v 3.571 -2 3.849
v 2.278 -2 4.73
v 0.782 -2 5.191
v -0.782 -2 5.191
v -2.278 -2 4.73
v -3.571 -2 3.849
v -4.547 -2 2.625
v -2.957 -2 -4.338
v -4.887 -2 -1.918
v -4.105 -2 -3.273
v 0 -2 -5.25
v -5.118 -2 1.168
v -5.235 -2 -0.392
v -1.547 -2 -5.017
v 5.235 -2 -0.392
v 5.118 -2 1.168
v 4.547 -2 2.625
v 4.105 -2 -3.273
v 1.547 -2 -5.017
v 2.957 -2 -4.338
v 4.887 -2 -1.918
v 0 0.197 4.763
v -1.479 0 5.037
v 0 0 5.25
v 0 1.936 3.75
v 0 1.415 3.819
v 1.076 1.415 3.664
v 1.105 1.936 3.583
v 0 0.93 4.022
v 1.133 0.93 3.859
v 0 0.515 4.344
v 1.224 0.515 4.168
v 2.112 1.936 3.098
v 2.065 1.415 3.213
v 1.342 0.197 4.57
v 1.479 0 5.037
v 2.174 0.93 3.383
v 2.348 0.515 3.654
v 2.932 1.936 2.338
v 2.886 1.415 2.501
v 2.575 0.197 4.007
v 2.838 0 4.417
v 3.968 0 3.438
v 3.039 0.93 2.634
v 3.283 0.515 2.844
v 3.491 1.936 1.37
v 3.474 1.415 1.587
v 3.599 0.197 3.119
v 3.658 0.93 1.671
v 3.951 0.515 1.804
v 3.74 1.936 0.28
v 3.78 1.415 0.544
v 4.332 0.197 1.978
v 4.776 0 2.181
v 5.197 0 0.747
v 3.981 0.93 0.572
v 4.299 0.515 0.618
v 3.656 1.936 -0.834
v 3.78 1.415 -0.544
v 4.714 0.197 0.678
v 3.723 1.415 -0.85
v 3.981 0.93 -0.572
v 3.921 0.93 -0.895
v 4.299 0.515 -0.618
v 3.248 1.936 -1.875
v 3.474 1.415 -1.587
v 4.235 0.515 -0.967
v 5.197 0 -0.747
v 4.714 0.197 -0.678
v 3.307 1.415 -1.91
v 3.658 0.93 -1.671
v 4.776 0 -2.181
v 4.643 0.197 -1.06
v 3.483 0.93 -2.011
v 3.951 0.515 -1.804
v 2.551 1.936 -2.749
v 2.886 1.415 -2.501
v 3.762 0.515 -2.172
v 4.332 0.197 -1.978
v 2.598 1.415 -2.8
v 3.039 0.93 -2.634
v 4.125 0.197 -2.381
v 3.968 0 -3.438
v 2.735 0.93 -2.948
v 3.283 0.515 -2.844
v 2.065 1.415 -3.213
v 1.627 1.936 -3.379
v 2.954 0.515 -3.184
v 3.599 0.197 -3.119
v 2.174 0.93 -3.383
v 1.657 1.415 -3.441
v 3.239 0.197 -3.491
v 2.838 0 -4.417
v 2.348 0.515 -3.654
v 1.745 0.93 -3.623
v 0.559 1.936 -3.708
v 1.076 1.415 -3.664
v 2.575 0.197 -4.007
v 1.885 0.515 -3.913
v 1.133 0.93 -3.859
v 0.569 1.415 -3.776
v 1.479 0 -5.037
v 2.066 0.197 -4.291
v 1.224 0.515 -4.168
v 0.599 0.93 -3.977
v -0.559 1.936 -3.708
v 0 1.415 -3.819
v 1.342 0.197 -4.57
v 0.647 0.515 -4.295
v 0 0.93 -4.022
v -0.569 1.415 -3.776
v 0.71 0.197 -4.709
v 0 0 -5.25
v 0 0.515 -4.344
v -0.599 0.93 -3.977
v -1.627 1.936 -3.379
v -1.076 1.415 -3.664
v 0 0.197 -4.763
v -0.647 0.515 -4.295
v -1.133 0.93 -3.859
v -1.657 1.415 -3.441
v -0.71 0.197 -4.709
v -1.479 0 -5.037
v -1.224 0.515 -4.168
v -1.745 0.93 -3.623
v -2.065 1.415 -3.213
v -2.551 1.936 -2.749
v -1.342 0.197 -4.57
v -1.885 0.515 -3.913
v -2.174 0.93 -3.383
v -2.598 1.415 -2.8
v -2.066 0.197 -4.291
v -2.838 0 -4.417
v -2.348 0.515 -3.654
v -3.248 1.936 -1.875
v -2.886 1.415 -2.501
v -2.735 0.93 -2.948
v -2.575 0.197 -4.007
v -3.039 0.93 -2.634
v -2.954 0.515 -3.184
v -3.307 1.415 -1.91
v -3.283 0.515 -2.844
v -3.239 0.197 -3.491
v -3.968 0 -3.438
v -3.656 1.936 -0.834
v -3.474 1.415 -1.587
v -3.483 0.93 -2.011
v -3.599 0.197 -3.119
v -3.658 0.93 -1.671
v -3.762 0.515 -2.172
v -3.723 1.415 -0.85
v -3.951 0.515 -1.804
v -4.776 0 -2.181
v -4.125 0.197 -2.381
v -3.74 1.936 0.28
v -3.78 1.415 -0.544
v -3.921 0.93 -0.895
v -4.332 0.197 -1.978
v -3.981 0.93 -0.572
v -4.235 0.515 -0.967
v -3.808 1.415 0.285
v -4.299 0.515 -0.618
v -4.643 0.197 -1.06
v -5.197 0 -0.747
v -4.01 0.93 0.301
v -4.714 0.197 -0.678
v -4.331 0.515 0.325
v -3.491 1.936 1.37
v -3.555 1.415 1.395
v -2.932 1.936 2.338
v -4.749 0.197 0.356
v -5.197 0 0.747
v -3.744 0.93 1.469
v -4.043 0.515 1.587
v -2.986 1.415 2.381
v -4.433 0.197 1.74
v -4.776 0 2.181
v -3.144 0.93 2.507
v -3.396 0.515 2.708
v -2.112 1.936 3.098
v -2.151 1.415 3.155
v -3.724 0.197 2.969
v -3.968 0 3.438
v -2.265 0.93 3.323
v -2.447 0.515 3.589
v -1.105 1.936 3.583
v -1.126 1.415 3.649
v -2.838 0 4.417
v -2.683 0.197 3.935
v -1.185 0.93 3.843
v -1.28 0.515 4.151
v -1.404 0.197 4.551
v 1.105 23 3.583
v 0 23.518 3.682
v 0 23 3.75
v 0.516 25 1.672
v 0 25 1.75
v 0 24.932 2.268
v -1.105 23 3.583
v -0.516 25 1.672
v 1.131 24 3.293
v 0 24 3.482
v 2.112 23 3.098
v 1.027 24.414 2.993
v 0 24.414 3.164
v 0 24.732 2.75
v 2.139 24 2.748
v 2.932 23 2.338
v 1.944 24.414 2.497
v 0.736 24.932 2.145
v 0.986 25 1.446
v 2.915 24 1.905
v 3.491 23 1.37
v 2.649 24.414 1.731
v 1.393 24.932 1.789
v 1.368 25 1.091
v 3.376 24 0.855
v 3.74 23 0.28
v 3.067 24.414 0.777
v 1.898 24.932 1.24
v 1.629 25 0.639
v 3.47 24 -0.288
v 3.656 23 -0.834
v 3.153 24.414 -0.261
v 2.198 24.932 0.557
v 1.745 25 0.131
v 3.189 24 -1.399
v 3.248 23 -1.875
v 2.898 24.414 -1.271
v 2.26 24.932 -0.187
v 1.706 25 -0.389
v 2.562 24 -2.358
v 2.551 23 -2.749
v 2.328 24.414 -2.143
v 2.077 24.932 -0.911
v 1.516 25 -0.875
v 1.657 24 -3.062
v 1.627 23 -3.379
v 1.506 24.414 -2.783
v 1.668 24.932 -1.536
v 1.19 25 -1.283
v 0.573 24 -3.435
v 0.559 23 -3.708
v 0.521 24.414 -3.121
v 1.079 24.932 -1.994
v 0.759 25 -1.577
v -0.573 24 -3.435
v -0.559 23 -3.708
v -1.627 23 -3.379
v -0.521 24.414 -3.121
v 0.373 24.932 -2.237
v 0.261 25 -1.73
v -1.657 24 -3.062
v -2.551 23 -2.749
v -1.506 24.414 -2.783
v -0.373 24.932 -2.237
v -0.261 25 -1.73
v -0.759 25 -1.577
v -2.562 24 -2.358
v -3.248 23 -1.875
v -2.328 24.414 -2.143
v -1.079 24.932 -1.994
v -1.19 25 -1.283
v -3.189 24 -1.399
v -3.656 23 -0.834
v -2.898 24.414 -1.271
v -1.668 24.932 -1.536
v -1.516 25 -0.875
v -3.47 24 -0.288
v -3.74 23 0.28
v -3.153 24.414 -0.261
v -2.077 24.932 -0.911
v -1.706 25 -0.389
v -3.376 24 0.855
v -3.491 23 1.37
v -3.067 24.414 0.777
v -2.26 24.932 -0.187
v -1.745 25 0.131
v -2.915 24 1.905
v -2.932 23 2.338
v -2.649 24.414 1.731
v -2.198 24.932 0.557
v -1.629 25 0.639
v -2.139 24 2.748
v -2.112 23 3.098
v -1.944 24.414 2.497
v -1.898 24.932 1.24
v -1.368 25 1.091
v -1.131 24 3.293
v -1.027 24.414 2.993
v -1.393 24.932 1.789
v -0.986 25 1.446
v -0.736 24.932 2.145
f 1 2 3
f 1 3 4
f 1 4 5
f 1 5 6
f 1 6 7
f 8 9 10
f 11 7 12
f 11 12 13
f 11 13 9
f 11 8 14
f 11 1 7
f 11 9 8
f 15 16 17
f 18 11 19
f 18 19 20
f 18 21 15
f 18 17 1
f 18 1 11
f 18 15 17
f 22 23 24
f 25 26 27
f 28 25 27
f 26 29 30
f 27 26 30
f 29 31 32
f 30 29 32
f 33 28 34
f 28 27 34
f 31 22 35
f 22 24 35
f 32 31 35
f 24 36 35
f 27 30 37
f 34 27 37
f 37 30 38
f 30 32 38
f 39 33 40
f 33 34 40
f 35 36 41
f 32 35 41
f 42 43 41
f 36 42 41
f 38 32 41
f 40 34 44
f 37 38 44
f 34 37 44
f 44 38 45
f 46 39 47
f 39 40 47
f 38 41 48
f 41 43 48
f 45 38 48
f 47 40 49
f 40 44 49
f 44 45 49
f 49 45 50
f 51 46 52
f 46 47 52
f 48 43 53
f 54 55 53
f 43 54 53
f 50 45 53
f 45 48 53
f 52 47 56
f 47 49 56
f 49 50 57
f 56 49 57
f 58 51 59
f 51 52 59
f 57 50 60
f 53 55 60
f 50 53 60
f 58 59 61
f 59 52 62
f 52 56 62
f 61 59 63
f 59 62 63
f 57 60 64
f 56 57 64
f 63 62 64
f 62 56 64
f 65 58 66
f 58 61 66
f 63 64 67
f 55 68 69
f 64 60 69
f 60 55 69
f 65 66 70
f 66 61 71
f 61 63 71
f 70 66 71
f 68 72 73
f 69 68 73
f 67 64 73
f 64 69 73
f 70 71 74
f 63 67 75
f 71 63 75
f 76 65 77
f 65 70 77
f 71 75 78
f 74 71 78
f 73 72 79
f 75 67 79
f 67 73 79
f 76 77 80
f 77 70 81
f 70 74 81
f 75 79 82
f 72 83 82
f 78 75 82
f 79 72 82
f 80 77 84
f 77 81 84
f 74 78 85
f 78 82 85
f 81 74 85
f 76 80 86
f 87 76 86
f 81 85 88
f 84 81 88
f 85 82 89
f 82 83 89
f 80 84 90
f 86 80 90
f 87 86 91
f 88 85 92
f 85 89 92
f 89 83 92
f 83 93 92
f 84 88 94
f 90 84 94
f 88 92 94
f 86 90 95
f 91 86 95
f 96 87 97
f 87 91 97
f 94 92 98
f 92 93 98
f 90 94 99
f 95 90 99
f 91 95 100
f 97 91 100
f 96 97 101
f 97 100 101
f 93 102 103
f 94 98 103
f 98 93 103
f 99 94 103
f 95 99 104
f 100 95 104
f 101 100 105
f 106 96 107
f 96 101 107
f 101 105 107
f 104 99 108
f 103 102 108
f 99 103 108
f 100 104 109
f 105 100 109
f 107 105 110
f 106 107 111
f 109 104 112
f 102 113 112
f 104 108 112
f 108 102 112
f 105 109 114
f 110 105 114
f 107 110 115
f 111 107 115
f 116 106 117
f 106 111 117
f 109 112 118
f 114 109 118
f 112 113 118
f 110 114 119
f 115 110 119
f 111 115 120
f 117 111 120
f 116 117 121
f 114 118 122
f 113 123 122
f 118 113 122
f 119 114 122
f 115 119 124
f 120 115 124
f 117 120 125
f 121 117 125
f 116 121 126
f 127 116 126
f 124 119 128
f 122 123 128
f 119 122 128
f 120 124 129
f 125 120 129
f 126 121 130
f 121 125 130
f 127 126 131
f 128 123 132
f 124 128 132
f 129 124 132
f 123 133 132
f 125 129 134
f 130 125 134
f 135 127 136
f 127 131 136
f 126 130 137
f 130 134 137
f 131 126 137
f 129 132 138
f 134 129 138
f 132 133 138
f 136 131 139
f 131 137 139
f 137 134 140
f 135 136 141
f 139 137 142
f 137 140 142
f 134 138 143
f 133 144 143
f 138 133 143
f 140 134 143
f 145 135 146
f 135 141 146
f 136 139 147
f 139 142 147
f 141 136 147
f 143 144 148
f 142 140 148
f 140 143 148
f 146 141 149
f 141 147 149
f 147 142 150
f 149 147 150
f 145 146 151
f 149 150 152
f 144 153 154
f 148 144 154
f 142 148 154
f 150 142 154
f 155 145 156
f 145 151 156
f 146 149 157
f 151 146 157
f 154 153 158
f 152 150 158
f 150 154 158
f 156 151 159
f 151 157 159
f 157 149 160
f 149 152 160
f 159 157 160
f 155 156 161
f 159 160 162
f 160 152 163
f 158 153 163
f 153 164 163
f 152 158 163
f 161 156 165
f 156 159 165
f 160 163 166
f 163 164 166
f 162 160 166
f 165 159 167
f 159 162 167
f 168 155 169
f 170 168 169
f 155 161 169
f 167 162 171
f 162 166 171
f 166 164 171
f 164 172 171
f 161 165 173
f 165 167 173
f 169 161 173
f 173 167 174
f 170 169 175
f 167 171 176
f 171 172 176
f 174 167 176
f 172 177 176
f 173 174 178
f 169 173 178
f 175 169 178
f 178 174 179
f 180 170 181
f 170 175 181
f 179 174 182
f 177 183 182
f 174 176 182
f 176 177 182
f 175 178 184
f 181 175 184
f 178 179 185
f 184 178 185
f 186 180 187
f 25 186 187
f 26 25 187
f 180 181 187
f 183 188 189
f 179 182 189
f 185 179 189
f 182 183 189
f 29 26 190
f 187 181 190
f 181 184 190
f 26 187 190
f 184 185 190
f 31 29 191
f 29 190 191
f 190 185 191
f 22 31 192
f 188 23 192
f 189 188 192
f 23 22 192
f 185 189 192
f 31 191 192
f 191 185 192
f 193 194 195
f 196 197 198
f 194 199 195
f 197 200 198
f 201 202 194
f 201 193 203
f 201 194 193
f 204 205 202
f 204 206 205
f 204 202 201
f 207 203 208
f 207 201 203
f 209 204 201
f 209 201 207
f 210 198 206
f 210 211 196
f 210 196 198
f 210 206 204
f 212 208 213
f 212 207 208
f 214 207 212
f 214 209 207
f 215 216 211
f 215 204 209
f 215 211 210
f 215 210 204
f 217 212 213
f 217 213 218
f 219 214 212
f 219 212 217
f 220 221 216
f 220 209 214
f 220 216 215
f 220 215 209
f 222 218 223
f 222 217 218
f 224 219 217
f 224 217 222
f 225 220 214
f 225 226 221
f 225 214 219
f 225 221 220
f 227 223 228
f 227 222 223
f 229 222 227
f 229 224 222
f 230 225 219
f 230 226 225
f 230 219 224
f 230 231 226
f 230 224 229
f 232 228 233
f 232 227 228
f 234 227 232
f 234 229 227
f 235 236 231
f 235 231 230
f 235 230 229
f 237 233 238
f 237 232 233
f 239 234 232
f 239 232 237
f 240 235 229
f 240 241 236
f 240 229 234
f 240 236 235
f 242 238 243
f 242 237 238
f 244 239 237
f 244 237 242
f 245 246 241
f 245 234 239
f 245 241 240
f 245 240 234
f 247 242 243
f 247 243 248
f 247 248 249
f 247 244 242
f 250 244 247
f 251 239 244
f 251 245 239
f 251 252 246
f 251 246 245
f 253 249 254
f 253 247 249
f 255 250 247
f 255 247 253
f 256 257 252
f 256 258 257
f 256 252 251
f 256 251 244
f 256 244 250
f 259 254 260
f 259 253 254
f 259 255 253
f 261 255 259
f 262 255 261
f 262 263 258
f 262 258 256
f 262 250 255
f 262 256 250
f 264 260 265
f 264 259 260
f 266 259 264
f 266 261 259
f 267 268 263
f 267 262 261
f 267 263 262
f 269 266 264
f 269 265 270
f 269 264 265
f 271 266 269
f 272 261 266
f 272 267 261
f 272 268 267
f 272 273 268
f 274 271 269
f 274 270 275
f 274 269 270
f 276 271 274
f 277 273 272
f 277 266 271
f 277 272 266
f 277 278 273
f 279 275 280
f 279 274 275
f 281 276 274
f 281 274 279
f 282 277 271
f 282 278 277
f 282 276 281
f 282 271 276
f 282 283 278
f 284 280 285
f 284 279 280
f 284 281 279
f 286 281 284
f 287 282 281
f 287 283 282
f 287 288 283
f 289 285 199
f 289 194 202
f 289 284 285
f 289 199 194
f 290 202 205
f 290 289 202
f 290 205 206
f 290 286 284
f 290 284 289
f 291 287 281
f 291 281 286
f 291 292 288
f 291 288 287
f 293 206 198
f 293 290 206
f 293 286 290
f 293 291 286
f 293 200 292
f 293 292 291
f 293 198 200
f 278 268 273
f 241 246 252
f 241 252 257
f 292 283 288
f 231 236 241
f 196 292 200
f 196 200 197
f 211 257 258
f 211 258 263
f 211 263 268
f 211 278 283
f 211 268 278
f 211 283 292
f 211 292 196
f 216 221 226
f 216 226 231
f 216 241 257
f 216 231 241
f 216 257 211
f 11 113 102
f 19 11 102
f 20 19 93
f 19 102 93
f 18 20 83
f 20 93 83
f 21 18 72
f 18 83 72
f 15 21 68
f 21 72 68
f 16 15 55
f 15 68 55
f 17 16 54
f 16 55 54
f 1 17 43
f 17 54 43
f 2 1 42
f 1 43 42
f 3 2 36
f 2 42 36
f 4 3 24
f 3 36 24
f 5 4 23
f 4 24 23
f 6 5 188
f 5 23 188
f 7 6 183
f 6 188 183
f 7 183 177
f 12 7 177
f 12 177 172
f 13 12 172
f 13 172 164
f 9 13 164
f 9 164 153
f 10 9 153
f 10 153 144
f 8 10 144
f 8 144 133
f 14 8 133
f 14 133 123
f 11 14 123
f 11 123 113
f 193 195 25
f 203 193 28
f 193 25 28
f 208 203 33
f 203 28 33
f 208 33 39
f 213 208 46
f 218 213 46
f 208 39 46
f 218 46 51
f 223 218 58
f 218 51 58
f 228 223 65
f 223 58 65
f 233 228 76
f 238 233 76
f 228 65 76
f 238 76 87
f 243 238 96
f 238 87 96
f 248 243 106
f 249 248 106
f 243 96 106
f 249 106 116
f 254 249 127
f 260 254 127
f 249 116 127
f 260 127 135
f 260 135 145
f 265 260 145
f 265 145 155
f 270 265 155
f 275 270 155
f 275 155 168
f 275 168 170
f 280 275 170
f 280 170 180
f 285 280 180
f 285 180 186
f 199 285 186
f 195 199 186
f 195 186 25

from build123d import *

# Parameters (mm, degrees)
SKETCH1_R           = 3.75
BOSS_EXTRUDE1_DEPTH = 25
FILLET1_R           = 2
SKETCH2_R           = 5.25
BOSS_EXTRUDE2_DEPTH = 2
FILLET2_R           = 2


with BuildPart() as part:
    # Sketch1 → Boss-Extrude1 (new body)
    with BuildSketch(Plane(origin=(0, 0, 0), x_dir=(1, 0, 0), z_dir=(0, 1, 0))):
        with Locations(Location((0, 0, 0), (0, 0, 270))):
            Circle(SKETCH1_R)
    extrude(amount=BOSS_EXTRUDE1_DEPTH)

    # Fillet1
    fillet1_edges = [part.edges().sort_by_distance(p)[0] for p in [
        (0, 25, -3.75),
    ]]
    fillet(fillet1_edges, radius=FILLET1_R)

    # Sketch2 → Boss-Extrude2 (add)
    with BuildSketch(Plane.XZ):
        with Locations(Location((0, 0, 0), (0, 0, 270))):
            Circle(SKETCH2_R)
    extrude(amount=BOSS_EXTRUDE2_DEPTH)

    # Fillet2
    # the kernel refuses this fillet: 2 mm, written as the material it adds along each edge
    with BuildSketch(Plane(origin=(0, 0, 0), x_dir=(0, 0, 1), z_dir=(-1, 0, 0))) as fillet2_piece_1:
        with BuildLine():
            CenterArc((5.75, 1.936491673), FILLET2_R, 180, 75.522487814)
            Line((3.75, 1.936491673), (3.71, 1.936491673))
            Line((3.71, 1.936491673), (3.71, 0))
            Line((3.71, 0), (3.75, -0.04))
            ThreePointArc((3.75, -0.04), (4.5, -0.04), (5.24, -0.038729833))
            Line((5.24, -0.038729833), (5.25, 0))
        make_face()
    revolve(axis=Axis((0, 0, 0), (0, 1, 0)))


solid = part.part
